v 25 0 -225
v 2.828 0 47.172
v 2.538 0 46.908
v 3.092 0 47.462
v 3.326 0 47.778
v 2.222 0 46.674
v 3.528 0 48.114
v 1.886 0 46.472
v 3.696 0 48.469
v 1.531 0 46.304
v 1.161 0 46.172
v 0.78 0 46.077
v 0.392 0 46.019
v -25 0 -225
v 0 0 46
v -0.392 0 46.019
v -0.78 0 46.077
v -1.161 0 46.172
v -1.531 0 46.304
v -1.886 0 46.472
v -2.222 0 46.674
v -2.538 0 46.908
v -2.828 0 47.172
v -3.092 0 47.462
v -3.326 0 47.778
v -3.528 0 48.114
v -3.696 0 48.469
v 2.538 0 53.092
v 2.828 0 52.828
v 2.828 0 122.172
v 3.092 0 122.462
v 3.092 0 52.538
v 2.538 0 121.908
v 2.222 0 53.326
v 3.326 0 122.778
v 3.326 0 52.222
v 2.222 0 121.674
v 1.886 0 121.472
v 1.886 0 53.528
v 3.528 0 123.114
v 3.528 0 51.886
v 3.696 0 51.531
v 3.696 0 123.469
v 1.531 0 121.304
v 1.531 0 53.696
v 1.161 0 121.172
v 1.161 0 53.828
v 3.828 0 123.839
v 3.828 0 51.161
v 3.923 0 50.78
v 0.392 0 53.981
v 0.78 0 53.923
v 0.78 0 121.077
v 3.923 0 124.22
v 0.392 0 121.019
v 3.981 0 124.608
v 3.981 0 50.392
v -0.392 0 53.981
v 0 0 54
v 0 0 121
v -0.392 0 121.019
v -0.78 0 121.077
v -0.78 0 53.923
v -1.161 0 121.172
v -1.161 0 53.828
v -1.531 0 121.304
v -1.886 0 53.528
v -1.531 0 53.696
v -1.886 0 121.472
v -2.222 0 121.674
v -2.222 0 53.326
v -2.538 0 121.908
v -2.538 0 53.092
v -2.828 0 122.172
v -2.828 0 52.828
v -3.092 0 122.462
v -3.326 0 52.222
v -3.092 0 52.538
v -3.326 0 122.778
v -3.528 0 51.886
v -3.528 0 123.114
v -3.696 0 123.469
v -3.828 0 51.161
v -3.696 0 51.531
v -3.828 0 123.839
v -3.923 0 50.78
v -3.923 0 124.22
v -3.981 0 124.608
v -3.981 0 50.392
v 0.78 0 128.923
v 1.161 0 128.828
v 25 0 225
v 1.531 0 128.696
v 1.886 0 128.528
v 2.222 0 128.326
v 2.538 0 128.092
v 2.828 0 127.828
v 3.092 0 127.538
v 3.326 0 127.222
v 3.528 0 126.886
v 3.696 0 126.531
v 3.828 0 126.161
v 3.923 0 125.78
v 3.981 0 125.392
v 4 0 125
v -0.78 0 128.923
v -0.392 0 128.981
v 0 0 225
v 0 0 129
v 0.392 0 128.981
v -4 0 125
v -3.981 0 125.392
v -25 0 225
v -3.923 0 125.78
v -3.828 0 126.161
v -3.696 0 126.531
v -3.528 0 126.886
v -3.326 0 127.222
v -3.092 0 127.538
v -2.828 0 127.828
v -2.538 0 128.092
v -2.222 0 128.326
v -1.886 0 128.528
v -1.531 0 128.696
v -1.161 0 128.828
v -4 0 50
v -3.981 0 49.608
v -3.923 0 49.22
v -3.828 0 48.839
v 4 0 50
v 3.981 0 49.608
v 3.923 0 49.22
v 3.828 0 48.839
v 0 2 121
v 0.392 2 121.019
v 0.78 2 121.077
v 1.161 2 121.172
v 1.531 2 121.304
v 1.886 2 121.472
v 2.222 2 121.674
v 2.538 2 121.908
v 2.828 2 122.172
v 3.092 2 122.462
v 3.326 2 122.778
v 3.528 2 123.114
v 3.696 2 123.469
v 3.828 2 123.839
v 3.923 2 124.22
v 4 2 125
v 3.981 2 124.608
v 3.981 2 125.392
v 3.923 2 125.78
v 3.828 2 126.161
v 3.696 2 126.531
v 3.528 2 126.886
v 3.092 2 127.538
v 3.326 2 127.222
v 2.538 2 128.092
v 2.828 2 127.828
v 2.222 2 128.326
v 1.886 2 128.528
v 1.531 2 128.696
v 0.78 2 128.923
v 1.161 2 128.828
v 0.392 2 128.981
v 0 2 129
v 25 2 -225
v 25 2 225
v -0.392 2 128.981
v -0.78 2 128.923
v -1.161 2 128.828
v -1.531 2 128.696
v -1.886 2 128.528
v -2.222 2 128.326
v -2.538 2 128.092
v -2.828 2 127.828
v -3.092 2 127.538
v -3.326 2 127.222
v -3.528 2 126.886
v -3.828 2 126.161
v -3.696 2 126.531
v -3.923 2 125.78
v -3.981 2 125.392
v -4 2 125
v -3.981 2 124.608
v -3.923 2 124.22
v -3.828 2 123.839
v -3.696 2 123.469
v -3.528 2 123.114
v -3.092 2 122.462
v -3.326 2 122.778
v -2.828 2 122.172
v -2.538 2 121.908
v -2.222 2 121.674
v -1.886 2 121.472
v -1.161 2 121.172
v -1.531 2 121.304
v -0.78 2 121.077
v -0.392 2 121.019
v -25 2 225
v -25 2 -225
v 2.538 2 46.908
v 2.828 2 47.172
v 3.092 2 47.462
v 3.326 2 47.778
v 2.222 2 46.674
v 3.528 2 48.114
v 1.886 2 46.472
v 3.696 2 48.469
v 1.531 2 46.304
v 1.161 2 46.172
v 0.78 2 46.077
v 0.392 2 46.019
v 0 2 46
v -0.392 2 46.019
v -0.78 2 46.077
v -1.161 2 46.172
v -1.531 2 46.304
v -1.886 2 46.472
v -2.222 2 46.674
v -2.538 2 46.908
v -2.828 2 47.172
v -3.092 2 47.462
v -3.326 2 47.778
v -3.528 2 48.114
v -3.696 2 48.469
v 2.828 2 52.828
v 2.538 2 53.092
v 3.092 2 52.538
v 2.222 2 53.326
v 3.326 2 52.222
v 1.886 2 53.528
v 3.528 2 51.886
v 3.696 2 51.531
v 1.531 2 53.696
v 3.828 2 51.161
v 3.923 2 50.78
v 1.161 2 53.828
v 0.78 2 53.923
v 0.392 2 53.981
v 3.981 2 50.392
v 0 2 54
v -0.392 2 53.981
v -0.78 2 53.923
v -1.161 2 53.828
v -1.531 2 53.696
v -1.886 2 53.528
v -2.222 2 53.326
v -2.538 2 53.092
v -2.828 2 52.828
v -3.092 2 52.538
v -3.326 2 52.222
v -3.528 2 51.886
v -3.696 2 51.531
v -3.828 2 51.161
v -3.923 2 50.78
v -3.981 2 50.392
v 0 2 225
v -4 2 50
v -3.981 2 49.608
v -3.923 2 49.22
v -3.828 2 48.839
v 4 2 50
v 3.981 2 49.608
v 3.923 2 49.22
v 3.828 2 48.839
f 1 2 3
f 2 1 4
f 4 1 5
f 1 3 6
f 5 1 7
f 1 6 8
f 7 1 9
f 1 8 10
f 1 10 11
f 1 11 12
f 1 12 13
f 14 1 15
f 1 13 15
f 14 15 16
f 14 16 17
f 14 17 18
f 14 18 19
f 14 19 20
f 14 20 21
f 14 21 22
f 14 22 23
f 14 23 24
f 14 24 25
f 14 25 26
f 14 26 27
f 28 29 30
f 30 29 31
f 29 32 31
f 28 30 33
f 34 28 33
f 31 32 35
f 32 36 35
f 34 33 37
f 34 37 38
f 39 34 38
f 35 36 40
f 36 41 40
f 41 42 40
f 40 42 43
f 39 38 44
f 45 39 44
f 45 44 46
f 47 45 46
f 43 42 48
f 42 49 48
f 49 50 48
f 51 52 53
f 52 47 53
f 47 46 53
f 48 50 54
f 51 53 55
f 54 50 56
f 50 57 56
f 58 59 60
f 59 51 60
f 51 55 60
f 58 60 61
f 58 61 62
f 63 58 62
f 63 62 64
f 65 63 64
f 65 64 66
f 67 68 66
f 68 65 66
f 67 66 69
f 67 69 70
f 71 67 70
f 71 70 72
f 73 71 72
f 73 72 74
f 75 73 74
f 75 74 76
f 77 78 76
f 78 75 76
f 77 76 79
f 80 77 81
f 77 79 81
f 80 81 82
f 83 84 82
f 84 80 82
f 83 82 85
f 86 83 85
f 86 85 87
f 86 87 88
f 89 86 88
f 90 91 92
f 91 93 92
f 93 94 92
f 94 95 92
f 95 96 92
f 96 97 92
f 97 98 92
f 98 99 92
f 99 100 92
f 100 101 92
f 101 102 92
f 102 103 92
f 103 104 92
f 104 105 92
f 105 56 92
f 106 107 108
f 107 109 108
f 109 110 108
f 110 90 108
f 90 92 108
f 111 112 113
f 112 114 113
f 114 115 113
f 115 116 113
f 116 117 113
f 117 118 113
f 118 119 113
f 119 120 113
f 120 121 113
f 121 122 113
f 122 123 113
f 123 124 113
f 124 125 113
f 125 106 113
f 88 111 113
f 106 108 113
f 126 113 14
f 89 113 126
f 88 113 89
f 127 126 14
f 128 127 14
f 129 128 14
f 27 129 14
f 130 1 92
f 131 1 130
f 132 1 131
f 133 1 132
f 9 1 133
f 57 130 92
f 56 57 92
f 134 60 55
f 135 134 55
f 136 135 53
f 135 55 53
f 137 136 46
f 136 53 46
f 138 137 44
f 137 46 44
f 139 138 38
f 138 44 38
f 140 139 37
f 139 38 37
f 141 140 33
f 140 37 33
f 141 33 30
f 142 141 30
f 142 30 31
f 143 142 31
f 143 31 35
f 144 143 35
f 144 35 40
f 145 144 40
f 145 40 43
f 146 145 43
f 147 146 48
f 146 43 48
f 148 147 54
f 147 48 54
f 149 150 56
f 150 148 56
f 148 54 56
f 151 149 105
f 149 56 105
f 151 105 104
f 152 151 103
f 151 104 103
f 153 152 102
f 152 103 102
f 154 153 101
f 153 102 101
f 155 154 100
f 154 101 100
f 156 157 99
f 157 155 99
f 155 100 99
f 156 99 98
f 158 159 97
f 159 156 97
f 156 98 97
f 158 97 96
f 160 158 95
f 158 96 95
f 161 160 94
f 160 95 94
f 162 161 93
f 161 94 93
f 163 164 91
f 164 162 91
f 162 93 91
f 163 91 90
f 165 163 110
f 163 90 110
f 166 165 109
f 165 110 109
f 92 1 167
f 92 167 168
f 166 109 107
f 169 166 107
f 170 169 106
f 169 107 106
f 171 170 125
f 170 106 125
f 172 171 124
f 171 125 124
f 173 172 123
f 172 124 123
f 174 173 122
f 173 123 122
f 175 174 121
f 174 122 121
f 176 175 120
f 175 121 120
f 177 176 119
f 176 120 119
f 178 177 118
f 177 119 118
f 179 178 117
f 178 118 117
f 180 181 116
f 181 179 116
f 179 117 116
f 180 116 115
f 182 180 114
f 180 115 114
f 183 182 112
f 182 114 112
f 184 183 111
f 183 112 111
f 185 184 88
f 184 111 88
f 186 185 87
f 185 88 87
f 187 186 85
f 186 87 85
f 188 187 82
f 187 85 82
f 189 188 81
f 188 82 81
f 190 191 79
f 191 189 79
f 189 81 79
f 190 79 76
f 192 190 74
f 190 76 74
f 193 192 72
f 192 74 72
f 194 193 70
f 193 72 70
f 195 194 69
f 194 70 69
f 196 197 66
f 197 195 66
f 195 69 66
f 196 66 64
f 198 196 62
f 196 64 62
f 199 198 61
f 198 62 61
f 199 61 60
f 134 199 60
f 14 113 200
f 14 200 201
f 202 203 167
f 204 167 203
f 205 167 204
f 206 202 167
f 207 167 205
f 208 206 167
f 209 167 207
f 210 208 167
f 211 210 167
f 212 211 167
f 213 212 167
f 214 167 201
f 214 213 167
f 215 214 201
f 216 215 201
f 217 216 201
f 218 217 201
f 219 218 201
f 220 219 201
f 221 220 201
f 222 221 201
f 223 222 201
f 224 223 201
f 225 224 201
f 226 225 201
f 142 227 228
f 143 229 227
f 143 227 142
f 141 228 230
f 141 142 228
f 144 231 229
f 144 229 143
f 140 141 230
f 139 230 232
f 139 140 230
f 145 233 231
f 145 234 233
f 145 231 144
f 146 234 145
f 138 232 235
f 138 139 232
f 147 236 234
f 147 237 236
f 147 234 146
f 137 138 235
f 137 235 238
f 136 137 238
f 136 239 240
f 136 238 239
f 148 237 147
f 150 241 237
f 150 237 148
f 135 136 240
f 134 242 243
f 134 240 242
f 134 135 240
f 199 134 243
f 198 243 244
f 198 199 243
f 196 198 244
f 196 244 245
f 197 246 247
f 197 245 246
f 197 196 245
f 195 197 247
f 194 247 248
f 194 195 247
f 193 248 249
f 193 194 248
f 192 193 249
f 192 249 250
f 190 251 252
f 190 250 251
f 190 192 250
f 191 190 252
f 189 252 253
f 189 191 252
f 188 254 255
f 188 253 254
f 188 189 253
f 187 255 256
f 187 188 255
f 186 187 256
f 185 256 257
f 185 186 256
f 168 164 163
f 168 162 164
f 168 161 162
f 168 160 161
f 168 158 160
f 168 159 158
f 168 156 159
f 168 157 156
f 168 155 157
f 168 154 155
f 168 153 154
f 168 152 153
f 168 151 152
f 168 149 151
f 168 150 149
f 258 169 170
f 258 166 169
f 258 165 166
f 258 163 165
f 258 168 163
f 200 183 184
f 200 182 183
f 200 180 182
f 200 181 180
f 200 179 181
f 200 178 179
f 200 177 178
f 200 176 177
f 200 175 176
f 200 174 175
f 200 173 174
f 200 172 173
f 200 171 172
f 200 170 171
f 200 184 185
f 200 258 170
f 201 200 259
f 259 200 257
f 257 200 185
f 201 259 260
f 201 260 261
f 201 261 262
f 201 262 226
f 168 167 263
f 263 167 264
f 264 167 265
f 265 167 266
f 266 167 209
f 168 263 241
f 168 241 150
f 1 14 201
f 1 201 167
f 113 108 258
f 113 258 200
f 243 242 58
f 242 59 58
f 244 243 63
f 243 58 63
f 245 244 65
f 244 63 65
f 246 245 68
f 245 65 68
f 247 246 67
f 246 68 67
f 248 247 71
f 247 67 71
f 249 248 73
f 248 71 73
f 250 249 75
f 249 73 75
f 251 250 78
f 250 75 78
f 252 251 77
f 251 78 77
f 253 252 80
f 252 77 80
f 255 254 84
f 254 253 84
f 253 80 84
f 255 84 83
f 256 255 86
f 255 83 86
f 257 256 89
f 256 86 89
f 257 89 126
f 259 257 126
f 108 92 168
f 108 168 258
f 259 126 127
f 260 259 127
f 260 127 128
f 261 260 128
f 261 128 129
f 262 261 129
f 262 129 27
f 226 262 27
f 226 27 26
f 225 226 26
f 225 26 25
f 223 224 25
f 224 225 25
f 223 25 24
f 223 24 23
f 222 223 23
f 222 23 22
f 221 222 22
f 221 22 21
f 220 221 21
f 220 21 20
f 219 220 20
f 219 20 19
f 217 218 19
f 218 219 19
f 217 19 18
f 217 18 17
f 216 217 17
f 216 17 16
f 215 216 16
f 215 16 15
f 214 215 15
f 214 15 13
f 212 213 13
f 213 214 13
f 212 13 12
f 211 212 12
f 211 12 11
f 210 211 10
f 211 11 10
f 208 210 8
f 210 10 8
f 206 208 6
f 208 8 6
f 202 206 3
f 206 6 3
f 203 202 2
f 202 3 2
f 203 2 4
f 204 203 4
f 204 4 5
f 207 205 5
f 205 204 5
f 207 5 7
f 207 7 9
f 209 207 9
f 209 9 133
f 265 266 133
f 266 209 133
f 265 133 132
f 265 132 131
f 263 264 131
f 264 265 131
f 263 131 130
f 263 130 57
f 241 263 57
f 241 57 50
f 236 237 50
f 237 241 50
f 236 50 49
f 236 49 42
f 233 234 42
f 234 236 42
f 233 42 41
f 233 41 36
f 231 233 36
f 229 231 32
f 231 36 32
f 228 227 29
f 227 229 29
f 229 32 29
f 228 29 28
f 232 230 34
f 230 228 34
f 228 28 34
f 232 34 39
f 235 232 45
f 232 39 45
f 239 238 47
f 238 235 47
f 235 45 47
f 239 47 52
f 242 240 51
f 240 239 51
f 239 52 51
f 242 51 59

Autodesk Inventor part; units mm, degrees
ref_plane "YZ Plane" through (0, 0, 0) normal (1, 0, 0) x (0, 1, 0)
ref_plane "XZ Plane" through (0, 0, 0) normal (0, 1, 0) x (-1, 0, 0)
ref_plane "XY Plane" through (0, 0, 0) normal (0, 0, 1) x (1, 0, 0)
sketch "Sketch1" plane through (0, 0, 0) normal (0, 1, 0) x (-1, 0, 0)
  line L0 (-25, 225) -> (25, 225)
  line L1 (25, 225) -> (25, -225)
  line L2 (25, -225) -> (-25, -225)
  line L3 (-25, -225) -> (-25, 225)
  line L4 (-25, 225) -> (25, -225) construction
  line L5 (25, 225) -> (-25, -225) construction
  line L6 (0, 225) -> (0, 125)
  circle A0 centre (0, 125) radius 4
  line L7 (0, 125) -> (0, 50)
  circle A1 centre (0, 50) radius 4
  point P0 (0, 0)
  dimension "d0" = 50
  dimension "d1" = 450
  dimension "d6" = 100
  dimension "d7" = 8
  dimension "d8" = 75
  dimension "d9" = 8
extrude "Extrusion2" add sketch "Sketch1" along normal blind 2
properties part number "Lup"
